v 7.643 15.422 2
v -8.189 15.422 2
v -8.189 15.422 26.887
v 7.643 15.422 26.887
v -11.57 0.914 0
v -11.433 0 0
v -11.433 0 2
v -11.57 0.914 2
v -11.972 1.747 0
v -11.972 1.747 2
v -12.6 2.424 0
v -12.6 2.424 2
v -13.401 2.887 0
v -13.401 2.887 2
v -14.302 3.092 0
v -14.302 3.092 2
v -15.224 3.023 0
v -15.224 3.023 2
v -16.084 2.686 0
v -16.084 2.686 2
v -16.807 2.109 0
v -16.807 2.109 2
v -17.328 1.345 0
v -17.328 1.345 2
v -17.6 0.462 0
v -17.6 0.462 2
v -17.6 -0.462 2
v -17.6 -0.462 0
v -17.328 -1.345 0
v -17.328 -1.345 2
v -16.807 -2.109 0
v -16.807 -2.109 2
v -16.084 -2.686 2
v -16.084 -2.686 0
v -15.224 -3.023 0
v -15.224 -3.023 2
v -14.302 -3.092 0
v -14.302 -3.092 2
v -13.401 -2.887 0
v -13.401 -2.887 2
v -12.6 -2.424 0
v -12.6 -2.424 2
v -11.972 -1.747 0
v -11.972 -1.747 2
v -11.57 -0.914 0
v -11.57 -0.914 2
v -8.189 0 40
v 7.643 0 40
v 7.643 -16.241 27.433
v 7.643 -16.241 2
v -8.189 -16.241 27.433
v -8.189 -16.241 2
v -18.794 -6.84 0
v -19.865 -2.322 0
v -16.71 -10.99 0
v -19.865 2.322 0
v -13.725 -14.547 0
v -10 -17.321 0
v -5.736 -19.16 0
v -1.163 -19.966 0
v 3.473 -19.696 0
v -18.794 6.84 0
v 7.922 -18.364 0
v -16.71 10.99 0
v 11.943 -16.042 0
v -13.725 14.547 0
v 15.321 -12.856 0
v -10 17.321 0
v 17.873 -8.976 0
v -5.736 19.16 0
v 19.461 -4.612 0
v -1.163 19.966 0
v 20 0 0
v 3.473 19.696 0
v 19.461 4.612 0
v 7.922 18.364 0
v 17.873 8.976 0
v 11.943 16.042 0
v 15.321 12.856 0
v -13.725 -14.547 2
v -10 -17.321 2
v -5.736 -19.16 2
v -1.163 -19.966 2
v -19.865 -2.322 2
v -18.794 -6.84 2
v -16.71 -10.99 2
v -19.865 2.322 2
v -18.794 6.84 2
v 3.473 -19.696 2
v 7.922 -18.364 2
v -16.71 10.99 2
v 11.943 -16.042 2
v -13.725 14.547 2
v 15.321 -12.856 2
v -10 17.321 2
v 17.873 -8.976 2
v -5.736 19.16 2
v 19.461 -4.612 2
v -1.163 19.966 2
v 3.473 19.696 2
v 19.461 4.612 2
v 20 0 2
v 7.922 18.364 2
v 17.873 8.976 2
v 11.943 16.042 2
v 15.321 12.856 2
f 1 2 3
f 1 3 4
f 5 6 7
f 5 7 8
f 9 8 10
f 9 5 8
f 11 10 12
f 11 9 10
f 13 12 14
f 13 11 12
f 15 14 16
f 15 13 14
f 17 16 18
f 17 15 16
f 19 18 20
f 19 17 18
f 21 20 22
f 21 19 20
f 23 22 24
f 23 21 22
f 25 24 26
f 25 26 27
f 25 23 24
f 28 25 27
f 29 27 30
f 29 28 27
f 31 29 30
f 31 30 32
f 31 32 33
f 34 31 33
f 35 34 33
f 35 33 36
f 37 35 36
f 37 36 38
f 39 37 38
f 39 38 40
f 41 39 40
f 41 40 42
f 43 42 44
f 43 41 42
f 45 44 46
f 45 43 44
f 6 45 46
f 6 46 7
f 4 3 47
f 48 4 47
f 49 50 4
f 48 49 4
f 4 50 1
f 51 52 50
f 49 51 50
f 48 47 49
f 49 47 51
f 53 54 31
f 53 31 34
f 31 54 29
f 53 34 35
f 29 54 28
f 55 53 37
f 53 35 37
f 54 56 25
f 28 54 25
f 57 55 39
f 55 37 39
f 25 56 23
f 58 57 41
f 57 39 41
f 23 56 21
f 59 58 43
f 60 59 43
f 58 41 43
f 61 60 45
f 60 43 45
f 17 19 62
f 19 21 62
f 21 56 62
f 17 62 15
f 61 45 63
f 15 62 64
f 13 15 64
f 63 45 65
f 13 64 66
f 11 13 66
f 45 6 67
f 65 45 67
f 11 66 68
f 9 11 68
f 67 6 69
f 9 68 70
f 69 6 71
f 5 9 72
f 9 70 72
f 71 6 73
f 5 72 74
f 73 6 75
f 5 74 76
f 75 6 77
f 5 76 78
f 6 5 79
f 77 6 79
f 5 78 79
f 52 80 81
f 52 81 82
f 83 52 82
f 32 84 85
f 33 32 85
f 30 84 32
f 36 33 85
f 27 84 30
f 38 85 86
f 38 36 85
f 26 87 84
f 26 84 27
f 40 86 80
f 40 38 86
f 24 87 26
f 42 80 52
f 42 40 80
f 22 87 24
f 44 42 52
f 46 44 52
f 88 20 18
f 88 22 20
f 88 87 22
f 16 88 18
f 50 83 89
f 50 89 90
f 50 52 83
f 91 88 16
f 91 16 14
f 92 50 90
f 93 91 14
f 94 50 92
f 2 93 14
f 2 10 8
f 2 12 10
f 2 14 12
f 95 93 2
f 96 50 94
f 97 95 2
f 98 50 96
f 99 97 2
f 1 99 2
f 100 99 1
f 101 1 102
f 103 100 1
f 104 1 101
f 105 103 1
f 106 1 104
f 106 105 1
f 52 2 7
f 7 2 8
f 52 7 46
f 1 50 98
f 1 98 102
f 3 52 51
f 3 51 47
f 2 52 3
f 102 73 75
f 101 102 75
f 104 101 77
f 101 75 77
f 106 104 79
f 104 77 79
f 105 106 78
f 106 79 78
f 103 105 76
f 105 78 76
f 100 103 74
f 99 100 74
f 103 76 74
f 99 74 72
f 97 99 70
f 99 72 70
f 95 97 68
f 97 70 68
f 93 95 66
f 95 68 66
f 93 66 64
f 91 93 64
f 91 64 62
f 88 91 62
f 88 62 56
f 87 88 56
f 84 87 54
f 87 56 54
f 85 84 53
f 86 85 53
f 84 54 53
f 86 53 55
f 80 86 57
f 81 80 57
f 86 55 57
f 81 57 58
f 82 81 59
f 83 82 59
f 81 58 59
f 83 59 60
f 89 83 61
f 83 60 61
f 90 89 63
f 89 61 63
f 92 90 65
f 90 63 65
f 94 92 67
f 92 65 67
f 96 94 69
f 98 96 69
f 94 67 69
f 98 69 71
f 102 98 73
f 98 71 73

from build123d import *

# Parameters (mm, degrees)
F0_R     = 20
F0_W     = 15.831889
F0_H     = 31.663778
F0_R_2   = 3.101009
F1_DEPTH = 2
F2_DEPTH = 40
F4_DEPTH = 25


with BuildPart() as f1:
    # F0 (on Top) → F1 (new body)
    with BuildSketch(Plane.XY):
        Circle(F0_R)
        with Locations((-0.272963, -0.409445)):
            Rectangle(F0_W, F0_H, mode=Mode.SUBTRACT)
        with Locations((-14.53372, 0)):
            Circle(F0_R_2, mode=Mode.SUBTRACT)
    extrude(amount=F1_DEPTH)

    # F0 (on Top) → F2 (join)
    with BuildSketch(Plane.XY):
        with Locations((-0.272963, -0.409445)):
            Rectangle(F0_W, F0_H)
    extrude(amount=F2_DEPTH)

    # F3 (on face) → F4 (cut)
    with BuildSketch(Plane(origin=(-8.188908, 0, 0), x_dir=(0, -1, 0), z_dir=(-1, 0, 0))):
        Polygon((0, 40), (16.241334, 27.432844), (16.241334, 40), align=None)
        Polygon((-15.422444, 26.886918), (0, 40), (-15.422444, 40), align=None)
    extrude(amount=-F4_DEPTH, mode=Mode.SUBTRACT)


solid = f1.part
